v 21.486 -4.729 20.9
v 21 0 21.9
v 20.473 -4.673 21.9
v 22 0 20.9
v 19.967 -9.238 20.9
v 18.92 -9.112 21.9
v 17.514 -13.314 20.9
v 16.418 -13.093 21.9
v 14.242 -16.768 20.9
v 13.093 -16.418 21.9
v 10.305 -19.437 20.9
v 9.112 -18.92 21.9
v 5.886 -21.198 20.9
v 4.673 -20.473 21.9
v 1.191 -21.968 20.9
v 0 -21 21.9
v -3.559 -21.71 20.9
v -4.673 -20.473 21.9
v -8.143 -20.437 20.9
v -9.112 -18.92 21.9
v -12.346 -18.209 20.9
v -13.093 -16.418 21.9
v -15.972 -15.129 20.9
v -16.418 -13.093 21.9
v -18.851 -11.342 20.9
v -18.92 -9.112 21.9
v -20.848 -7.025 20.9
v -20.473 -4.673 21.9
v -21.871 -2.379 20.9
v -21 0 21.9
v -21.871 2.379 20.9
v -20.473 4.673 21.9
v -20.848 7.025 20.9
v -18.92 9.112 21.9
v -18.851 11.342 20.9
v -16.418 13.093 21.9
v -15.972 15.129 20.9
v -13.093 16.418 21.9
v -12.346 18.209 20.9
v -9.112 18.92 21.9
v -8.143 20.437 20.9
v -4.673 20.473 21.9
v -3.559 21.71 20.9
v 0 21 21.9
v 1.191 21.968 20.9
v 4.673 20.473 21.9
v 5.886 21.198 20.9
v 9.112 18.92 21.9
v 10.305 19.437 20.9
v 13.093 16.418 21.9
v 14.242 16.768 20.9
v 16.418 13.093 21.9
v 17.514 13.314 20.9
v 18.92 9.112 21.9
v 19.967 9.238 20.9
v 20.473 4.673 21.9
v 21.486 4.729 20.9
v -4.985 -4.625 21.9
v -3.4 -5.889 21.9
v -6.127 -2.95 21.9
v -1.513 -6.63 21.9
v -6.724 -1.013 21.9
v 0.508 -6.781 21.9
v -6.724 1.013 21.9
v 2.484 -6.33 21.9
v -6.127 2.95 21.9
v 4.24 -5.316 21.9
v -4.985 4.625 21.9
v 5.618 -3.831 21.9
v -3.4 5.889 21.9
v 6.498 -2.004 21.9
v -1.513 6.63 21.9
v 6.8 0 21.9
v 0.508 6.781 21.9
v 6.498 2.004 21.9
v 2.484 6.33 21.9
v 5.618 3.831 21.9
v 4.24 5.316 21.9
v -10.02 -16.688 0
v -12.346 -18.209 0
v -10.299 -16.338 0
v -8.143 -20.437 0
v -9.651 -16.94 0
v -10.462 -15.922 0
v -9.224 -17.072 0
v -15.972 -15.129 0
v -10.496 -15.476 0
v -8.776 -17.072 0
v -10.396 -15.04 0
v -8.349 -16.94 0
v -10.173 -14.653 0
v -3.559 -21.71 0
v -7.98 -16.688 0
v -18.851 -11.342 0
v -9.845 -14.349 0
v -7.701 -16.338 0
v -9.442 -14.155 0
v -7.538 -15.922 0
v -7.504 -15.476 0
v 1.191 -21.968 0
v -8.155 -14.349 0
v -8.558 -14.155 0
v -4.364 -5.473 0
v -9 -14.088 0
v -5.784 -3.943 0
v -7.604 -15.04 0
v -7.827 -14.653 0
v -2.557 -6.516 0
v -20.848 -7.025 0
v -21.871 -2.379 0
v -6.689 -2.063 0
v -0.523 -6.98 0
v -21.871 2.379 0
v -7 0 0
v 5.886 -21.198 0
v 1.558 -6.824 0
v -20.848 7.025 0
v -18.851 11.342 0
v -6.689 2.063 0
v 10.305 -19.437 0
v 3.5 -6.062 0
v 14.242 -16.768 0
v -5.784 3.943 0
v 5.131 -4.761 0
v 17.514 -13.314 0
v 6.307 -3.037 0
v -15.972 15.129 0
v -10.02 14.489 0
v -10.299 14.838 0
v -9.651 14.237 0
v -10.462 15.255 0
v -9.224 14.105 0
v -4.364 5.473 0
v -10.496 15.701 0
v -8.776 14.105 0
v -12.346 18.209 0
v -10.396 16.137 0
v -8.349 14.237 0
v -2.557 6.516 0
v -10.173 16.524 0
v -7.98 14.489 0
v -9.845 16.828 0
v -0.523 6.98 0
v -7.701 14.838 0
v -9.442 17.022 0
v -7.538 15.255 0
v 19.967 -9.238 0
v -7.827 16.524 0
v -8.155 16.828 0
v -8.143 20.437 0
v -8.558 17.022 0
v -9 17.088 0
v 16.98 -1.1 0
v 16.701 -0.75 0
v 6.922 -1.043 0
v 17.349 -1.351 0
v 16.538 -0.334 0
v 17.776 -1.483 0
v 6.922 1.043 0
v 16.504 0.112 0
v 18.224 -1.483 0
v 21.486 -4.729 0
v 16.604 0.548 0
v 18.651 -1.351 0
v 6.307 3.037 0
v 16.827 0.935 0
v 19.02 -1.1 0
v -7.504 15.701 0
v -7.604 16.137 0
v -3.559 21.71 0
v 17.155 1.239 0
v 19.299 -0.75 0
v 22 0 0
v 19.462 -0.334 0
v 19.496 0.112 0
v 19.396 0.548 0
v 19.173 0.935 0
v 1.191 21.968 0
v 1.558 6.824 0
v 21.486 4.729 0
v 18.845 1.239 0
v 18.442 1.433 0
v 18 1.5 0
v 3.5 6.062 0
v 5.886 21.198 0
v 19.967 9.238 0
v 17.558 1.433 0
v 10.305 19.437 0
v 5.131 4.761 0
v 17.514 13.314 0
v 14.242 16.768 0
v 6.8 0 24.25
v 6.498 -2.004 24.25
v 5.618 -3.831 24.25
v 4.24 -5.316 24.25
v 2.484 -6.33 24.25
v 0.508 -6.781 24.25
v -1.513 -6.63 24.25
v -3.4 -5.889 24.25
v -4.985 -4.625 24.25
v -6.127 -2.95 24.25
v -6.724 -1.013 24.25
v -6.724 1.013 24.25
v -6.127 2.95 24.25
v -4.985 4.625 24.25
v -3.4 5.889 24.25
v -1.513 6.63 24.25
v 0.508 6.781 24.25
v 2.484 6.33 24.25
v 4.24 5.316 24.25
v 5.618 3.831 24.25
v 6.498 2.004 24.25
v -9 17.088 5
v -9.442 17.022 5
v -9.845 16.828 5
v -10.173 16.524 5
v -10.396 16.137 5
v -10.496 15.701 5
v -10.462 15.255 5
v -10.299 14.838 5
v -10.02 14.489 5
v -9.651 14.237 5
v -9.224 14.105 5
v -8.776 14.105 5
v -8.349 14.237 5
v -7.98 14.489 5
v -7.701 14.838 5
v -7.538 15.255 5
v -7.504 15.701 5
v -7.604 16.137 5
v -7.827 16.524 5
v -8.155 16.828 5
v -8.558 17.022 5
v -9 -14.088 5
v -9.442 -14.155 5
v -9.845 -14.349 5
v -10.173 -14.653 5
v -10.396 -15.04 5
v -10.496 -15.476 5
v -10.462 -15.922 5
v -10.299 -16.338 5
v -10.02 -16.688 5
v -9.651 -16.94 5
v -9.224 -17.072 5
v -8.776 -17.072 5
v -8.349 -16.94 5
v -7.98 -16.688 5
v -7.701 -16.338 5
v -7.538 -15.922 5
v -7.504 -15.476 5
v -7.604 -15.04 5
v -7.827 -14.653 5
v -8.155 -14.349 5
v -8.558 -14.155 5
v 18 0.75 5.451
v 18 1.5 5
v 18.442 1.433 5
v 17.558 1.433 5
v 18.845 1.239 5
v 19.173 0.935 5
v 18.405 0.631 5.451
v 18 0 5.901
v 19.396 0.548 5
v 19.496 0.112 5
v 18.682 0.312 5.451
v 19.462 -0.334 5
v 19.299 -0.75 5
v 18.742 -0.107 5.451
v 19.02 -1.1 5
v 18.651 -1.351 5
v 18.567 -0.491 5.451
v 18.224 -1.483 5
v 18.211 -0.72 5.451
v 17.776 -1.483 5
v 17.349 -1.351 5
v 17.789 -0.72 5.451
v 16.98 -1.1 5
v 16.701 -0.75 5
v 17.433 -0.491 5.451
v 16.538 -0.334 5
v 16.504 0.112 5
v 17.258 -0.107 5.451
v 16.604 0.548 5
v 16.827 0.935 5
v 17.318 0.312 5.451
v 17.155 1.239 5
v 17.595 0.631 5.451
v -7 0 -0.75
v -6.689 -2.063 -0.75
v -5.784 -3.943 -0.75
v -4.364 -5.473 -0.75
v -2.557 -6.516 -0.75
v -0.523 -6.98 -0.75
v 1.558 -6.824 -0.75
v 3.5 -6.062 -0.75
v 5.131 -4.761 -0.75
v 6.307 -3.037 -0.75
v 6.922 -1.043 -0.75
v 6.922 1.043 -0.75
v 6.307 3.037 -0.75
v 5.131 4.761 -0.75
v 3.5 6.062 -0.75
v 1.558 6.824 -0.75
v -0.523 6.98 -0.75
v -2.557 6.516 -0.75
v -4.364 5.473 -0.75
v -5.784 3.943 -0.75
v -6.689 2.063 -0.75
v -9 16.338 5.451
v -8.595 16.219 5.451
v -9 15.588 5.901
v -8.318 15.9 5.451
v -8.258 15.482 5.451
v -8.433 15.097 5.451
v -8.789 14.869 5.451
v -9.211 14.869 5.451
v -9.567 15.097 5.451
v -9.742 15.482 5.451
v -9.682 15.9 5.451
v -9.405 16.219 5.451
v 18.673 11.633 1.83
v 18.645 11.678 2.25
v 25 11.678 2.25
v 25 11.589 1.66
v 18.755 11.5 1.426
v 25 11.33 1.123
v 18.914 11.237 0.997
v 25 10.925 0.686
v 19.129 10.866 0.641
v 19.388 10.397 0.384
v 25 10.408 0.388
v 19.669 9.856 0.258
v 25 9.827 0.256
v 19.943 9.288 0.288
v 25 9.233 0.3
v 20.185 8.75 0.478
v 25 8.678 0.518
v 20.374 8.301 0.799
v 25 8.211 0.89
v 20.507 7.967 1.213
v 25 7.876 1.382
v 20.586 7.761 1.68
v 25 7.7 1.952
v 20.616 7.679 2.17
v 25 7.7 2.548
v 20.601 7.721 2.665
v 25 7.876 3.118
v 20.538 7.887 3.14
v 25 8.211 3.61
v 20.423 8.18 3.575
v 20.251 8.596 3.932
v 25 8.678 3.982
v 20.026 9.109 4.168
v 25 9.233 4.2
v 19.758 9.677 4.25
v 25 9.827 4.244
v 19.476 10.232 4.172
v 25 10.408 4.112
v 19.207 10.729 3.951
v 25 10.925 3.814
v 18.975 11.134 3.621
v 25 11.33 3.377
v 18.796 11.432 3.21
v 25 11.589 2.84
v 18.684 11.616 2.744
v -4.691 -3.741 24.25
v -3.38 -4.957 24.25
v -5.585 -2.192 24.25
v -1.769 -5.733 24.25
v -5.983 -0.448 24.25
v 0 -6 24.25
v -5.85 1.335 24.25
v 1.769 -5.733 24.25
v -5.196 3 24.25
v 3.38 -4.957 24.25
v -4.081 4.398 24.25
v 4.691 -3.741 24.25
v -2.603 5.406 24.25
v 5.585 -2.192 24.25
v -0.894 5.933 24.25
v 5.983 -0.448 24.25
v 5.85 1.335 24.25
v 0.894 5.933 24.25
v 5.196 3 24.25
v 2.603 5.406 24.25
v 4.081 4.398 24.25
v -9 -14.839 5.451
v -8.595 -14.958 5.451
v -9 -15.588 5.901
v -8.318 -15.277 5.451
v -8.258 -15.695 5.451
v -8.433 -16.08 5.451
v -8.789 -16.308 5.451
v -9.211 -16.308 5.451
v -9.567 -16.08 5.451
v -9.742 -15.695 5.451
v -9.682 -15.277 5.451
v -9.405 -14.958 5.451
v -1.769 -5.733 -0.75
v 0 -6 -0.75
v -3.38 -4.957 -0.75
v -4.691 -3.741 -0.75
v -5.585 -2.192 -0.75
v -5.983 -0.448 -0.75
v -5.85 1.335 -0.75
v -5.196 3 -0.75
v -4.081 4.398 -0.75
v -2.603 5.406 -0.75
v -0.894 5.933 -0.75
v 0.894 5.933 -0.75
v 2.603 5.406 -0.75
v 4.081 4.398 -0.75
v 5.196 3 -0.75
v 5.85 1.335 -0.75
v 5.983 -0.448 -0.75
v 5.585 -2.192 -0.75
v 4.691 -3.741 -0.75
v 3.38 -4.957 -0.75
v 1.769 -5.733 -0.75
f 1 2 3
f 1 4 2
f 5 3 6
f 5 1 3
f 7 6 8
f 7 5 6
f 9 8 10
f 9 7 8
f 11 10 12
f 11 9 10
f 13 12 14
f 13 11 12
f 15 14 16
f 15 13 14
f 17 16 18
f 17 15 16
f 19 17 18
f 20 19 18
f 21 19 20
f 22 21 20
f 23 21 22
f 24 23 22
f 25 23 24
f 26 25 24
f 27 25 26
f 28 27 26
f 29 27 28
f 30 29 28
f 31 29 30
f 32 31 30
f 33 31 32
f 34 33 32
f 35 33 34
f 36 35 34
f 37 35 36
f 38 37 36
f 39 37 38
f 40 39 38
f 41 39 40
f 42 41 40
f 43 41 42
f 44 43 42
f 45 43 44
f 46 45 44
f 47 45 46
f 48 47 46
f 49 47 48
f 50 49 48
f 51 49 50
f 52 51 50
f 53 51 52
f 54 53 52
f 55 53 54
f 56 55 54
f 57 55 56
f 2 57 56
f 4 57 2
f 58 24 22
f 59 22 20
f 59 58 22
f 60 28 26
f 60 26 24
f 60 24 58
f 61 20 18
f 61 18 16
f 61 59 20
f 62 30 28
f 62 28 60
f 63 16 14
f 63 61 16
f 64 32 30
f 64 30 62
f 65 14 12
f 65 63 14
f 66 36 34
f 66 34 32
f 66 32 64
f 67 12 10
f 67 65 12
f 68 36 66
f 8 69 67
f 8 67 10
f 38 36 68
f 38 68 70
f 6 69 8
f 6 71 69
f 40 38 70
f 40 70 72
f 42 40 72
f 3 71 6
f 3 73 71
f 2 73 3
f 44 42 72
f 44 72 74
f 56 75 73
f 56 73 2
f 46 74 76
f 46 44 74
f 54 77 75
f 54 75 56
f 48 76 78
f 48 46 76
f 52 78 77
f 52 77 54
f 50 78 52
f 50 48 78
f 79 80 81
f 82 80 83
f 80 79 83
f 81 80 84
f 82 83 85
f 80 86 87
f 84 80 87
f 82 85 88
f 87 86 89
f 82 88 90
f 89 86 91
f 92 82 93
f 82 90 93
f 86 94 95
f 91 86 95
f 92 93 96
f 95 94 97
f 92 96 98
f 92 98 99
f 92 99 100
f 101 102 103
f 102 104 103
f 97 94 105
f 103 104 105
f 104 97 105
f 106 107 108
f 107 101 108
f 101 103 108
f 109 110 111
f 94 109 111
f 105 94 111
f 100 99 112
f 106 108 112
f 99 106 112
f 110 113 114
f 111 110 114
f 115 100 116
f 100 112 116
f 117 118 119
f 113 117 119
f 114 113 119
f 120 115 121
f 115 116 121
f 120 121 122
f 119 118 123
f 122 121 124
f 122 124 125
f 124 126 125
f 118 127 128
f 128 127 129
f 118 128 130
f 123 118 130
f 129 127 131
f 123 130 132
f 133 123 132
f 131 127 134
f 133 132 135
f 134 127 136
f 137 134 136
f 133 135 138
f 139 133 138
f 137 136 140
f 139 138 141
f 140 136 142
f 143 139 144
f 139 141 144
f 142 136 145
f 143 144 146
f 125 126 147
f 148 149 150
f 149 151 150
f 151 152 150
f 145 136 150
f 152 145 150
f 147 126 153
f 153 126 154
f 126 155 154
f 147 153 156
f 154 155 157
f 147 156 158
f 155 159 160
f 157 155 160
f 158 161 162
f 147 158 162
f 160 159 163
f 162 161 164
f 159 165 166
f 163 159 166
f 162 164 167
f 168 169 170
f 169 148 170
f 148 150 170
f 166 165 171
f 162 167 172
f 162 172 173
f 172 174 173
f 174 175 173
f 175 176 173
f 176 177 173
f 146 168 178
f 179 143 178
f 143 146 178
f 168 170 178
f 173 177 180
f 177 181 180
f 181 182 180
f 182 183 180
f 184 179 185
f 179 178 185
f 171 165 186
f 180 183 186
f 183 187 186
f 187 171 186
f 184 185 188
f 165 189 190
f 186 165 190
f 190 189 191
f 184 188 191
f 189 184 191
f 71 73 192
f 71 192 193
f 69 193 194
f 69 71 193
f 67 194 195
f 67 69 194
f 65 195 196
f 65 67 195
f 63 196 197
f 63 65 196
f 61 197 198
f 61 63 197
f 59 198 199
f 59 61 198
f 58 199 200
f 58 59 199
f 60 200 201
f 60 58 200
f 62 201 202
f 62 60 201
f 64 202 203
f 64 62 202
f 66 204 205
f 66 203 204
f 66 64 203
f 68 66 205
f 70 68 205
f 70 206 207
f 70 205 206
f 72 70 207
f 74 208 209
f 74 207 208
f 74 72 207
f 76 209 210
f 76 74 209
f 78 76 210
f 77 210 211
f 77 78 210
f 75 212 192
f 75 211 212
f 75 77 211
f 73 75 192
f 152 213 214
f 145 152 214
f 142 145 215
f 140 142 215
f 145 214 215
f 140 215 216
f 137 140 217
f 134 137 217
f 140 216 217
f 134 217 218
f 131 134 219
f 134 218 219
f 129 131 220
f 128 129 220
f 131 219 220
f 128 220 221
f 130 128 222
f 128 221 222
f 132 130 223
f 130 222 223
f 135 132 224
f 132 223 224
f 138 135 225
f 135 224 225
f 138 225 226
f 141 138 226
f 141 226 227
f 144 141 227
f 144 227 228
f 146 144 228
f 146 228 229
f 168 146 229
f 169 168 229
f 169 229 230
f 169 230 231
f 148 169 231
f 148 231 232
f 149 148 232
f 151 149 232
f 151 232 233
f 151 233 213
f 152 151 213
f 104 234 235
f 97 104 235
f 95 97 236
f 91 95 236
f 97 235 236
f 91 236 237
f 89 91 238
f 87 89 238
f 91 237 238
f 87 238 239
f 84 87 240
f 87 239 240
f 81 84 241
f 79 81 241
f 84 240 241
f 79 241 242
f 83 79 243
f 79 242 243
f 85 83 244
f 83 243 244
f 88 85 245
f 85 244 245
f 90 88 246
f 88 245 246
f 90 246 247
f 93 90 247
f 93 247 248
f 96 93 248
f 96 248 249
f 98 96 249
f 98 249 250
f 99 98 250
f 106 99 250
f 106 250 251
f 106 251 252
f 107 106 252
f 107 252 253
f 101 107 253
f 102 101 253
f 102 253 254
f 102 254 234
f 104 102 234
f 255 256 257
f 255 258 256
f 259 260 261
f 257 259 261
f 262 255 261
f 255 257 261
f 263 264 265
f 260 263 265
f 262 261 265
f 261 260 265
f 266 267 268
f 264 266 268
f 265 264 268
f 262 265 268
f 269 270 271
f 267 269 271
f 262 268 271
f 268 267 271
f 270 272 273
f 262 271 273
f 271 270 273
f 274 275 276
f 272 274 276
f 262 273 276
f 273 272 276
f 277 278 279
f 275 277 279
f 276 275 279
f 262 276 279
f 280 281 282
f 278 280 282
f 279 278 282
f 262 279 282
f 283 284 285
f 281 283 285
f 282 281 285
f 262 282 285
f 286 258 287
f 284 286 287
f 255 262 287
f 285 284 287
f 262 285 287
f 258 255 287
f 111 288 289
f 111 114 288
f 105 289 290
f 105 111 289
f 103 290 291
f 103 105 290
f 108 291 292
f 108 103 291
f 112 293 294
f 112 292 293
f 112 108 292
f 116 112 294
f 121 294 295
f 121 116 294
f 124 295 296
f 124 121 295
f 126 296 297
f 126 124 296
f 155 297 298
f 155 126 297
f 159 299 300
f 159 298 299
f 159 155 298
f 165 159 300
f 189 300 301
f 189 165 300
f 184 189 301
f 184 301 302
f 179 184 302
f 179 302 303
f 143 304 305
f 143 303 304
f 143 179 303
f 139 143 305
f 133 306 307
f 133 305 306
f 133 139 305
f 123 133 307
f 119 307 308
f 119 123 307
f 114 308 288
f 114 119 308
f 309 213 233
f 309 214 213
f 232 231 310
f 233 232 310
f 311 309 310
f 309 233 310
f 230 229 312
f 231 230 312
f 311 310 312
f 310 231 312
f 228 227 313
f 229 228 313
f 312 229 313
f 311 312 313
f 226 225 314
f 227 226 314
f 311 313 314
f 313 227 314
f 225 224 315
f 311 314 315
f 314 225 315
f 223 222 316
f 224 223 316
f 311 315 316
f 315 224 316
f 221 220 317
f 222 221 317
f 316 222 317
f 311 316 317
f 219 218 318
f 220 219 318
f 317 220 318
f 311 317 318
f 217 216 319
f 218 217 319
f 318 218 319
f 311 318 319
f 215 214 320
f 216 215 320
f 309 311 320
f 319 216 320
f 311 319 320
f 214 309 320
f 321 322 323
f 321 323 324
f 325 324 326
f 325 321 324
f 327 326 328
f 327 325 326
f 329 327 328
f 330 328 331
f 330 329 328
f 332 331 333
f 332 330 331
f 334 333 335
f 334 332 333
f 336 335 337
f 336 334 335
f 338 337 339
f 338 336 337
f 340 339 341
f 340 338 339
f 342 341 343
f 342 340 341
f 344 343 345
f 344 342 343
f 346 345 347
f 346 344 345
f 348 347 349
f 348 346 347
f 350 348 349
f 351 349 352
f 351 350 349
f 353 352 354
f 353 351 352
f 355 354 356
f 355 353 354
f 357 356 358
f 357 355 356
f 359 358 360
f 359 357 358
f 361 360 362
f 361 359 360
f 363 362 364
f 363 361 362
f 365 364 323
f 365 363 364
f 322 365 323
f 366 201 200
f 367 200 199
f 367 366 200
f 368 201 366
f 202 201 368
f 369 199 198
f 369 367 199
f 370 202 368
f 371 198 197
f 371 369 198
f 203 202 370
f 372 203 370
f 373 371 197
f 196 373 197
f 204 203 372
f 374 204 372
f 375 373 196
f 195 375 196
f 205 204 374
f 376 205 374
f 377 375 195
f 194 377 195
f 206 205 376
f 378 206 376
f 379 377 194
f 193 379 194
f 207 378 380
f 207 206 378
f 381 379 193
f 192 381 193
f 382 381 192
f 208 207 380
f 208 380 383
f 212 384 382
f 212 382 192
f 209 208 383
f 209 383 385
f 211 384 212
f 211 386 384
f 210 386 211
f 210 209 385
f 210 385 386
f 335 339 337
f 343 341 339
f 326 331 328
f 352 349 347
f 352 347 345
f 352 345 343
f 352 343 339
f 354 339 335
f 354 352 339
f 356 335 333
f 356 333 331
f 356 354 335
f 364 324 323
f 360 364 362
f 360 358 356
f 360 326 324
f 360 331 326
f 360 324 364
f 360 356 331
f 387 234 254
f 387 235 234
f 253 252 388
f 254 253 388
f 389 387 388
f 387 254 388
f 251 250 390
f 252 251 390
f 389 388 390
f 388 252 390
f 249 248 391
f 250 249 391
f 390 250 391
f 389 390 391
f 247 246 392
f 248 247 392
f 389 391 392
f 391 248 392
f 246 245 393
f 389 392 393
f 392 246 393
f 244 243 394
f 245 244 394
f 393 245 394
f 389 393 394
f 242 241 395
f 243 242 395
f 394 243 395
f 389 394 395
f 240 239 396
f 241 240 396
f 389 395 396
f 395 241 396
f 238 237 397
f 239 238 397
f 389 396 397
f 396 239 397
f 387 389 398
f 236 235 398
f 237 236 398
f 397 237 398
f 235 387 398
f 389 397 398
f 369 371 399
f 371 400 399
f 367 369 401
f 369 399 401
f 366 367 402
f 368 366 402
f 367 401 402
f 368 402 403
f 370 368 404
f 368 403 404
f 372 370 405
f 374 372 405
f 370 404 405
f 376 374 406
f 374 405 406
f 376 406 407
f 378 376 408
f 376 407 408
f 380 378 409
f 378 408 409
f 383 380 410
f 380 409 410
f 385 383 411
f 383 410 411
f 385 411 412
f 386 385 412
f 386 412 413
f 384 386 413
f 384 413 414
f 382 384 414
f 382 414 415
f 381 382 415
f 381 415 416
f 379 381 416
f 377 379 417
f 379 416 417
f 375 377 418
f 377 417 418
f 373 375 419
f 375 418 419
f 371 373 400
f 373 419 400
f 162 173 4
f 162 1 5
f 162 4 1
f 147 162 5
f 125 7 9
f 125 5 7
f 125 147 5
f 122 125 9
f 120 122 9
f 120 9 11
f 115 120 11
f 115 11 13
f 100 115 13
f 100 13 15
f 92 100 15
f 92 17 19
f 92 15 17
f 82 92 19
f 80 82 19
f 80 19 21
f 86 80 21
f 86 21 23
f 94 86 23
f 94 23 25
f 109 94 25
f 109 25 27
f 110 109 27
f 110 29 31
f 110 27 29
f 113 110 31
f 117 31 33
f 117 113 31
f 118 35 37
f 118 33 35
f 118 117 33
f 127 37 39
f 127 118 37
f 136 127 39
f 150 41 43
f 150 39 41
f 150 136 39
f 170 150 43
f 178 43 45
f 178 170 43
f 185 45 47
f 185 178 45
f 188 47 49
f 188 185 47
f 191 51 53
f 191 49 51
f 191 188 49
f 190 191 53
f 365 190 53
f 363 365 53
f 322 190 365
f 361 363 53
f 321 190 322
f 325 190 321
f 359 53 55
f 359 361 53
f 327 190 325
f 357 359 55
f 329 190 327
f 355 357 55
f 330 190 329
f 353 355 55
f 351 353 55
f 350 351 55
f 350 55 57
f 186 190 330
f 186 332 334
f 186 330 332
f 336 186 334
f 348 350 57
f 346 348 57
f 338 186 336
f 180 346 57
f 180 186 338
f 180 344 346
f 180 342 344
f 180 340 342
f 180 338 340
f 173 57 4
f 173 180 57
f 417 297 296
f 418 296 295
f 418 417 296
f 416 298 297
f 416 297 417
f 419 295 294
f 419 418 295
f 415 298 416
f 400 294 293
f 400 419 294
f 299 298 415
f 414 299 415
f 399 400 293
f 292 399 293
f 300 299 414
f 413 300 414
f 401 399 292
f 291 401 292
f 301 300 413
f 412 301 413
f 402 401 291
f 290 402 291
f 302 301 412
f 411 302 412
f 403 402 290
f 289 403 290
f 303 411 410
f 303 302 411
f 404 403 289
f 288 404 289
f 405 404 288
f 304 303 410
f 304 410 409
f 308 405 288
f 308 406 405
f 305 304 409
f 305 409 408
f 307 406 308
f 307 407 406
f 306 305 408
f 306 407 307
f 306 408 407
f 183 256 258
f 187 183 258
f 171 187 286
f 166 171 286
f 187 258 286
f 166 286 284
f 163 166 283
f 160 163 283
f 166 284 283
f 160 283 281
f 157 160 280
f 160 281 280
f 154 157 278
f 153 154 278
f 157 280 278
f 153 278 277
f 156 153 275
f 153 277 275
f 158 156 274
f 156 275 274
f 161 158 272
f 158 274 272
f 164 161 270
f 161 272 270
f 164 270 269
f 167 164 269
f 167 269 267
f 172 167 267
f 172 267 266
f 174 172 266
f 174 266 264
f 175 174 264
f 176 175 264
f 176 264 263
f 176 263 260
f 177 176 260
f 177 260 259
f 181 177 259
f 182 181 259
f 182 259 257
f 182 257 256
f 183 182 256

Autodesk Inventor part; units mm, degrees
ref_plane "YZ Plane" through (0, 0, 0) normal (1, 0, 0) x (0, 1, 0)
ref_plane "XZ Plane" through (0, 0, 0) normal (0, 1, 0) x (-1, 0, 0)
ref_plane "XY Plane" through (0, 0, 0) normal (0, 0, 1) x (1, 0, 0)
sketch "スケッチ1" plane through (0, 0, 0) normal (0, 0, 1) x (1, 0, 0)
  circle A0 centre (0, 0) radius 22
  dimension "d0" = 44
extrude "押し出し1" add sketch "スケッチ1" along normal blind 21.9
chamfer "面取り1" distance 1 angle 45 1 edges at (-22, 0, 21.9)
sketch "スケッチ2" plane through (0, 0, 21.9) normal (0, 0, 1) x (1, 0, 0)
  circle A0 centre (0, 0) radius 6.8
  dimension "d6" = 13.6
extrude "押し出し2" add sketch "スケッチ2" along normal blind 2.35
sketch "スケッチ6" plane through (0, 0, 0) normal (0, 0, 1) x (1, 0, 0)
  point P0 (0, 0)
sketch "スケッチ8" plane through (0, 0, 0) normal (0, 1, 0) x (-1, 0, 0)
  point P0 (0, 0)
sketch "スケッチ9" plane through (0, 0, 0) normal (1, 0, 0) x (0, 1, 0)
  line L0 (-22, 0) -> (22, 0) projected
  circle A0 centre (9.6776, 2.25) radius 2
  point P0 (0, 0)
  dimension "d30" = 2.25
  dimension "d31" = 4
extrude "押し出し3" add sketch "スケッチ9" along normal blind 25
sketch "スケッチ12" plane through (0, 0, 0) normal (0, 0, -1) x (-1, 0, 0)
  circle A0 centre (0, 0) radius 7
  dimension "d44" = 14
extrude "押し出し5" add sketch "スケッチ12" along normal blind 0.75
sketch "スケッチ13" plane through (0, 0, 24.25) normal (0, 0, 1) x (1, 0, 0)
  point P0 (0, 0)
  point P1 (0, 0)
hole "穴4" at (0, 0, 24.25) direction (0, 0, -1) diameter 12 end through all
sketch "スケッチ14" plane through (0, 0, 0) normal (0, 0, -1) x (-1, 0, 0)
  point P0 (0, 0)
  point P1 (-18, 0)
  point P2 (9, -15.5885)
  point P3 (9, 15.5885)
  dimension "d54" = 18
  dimension "d57" = 360
hole "穴5" at (18, 0, 0) at (-9, -15.5885, 0) at (-9, 15.5885, 0) direction (0, 0, 1) diameter 3 depth 5 tip angle 118
properties part number "meh-30-pエンコーダ"
